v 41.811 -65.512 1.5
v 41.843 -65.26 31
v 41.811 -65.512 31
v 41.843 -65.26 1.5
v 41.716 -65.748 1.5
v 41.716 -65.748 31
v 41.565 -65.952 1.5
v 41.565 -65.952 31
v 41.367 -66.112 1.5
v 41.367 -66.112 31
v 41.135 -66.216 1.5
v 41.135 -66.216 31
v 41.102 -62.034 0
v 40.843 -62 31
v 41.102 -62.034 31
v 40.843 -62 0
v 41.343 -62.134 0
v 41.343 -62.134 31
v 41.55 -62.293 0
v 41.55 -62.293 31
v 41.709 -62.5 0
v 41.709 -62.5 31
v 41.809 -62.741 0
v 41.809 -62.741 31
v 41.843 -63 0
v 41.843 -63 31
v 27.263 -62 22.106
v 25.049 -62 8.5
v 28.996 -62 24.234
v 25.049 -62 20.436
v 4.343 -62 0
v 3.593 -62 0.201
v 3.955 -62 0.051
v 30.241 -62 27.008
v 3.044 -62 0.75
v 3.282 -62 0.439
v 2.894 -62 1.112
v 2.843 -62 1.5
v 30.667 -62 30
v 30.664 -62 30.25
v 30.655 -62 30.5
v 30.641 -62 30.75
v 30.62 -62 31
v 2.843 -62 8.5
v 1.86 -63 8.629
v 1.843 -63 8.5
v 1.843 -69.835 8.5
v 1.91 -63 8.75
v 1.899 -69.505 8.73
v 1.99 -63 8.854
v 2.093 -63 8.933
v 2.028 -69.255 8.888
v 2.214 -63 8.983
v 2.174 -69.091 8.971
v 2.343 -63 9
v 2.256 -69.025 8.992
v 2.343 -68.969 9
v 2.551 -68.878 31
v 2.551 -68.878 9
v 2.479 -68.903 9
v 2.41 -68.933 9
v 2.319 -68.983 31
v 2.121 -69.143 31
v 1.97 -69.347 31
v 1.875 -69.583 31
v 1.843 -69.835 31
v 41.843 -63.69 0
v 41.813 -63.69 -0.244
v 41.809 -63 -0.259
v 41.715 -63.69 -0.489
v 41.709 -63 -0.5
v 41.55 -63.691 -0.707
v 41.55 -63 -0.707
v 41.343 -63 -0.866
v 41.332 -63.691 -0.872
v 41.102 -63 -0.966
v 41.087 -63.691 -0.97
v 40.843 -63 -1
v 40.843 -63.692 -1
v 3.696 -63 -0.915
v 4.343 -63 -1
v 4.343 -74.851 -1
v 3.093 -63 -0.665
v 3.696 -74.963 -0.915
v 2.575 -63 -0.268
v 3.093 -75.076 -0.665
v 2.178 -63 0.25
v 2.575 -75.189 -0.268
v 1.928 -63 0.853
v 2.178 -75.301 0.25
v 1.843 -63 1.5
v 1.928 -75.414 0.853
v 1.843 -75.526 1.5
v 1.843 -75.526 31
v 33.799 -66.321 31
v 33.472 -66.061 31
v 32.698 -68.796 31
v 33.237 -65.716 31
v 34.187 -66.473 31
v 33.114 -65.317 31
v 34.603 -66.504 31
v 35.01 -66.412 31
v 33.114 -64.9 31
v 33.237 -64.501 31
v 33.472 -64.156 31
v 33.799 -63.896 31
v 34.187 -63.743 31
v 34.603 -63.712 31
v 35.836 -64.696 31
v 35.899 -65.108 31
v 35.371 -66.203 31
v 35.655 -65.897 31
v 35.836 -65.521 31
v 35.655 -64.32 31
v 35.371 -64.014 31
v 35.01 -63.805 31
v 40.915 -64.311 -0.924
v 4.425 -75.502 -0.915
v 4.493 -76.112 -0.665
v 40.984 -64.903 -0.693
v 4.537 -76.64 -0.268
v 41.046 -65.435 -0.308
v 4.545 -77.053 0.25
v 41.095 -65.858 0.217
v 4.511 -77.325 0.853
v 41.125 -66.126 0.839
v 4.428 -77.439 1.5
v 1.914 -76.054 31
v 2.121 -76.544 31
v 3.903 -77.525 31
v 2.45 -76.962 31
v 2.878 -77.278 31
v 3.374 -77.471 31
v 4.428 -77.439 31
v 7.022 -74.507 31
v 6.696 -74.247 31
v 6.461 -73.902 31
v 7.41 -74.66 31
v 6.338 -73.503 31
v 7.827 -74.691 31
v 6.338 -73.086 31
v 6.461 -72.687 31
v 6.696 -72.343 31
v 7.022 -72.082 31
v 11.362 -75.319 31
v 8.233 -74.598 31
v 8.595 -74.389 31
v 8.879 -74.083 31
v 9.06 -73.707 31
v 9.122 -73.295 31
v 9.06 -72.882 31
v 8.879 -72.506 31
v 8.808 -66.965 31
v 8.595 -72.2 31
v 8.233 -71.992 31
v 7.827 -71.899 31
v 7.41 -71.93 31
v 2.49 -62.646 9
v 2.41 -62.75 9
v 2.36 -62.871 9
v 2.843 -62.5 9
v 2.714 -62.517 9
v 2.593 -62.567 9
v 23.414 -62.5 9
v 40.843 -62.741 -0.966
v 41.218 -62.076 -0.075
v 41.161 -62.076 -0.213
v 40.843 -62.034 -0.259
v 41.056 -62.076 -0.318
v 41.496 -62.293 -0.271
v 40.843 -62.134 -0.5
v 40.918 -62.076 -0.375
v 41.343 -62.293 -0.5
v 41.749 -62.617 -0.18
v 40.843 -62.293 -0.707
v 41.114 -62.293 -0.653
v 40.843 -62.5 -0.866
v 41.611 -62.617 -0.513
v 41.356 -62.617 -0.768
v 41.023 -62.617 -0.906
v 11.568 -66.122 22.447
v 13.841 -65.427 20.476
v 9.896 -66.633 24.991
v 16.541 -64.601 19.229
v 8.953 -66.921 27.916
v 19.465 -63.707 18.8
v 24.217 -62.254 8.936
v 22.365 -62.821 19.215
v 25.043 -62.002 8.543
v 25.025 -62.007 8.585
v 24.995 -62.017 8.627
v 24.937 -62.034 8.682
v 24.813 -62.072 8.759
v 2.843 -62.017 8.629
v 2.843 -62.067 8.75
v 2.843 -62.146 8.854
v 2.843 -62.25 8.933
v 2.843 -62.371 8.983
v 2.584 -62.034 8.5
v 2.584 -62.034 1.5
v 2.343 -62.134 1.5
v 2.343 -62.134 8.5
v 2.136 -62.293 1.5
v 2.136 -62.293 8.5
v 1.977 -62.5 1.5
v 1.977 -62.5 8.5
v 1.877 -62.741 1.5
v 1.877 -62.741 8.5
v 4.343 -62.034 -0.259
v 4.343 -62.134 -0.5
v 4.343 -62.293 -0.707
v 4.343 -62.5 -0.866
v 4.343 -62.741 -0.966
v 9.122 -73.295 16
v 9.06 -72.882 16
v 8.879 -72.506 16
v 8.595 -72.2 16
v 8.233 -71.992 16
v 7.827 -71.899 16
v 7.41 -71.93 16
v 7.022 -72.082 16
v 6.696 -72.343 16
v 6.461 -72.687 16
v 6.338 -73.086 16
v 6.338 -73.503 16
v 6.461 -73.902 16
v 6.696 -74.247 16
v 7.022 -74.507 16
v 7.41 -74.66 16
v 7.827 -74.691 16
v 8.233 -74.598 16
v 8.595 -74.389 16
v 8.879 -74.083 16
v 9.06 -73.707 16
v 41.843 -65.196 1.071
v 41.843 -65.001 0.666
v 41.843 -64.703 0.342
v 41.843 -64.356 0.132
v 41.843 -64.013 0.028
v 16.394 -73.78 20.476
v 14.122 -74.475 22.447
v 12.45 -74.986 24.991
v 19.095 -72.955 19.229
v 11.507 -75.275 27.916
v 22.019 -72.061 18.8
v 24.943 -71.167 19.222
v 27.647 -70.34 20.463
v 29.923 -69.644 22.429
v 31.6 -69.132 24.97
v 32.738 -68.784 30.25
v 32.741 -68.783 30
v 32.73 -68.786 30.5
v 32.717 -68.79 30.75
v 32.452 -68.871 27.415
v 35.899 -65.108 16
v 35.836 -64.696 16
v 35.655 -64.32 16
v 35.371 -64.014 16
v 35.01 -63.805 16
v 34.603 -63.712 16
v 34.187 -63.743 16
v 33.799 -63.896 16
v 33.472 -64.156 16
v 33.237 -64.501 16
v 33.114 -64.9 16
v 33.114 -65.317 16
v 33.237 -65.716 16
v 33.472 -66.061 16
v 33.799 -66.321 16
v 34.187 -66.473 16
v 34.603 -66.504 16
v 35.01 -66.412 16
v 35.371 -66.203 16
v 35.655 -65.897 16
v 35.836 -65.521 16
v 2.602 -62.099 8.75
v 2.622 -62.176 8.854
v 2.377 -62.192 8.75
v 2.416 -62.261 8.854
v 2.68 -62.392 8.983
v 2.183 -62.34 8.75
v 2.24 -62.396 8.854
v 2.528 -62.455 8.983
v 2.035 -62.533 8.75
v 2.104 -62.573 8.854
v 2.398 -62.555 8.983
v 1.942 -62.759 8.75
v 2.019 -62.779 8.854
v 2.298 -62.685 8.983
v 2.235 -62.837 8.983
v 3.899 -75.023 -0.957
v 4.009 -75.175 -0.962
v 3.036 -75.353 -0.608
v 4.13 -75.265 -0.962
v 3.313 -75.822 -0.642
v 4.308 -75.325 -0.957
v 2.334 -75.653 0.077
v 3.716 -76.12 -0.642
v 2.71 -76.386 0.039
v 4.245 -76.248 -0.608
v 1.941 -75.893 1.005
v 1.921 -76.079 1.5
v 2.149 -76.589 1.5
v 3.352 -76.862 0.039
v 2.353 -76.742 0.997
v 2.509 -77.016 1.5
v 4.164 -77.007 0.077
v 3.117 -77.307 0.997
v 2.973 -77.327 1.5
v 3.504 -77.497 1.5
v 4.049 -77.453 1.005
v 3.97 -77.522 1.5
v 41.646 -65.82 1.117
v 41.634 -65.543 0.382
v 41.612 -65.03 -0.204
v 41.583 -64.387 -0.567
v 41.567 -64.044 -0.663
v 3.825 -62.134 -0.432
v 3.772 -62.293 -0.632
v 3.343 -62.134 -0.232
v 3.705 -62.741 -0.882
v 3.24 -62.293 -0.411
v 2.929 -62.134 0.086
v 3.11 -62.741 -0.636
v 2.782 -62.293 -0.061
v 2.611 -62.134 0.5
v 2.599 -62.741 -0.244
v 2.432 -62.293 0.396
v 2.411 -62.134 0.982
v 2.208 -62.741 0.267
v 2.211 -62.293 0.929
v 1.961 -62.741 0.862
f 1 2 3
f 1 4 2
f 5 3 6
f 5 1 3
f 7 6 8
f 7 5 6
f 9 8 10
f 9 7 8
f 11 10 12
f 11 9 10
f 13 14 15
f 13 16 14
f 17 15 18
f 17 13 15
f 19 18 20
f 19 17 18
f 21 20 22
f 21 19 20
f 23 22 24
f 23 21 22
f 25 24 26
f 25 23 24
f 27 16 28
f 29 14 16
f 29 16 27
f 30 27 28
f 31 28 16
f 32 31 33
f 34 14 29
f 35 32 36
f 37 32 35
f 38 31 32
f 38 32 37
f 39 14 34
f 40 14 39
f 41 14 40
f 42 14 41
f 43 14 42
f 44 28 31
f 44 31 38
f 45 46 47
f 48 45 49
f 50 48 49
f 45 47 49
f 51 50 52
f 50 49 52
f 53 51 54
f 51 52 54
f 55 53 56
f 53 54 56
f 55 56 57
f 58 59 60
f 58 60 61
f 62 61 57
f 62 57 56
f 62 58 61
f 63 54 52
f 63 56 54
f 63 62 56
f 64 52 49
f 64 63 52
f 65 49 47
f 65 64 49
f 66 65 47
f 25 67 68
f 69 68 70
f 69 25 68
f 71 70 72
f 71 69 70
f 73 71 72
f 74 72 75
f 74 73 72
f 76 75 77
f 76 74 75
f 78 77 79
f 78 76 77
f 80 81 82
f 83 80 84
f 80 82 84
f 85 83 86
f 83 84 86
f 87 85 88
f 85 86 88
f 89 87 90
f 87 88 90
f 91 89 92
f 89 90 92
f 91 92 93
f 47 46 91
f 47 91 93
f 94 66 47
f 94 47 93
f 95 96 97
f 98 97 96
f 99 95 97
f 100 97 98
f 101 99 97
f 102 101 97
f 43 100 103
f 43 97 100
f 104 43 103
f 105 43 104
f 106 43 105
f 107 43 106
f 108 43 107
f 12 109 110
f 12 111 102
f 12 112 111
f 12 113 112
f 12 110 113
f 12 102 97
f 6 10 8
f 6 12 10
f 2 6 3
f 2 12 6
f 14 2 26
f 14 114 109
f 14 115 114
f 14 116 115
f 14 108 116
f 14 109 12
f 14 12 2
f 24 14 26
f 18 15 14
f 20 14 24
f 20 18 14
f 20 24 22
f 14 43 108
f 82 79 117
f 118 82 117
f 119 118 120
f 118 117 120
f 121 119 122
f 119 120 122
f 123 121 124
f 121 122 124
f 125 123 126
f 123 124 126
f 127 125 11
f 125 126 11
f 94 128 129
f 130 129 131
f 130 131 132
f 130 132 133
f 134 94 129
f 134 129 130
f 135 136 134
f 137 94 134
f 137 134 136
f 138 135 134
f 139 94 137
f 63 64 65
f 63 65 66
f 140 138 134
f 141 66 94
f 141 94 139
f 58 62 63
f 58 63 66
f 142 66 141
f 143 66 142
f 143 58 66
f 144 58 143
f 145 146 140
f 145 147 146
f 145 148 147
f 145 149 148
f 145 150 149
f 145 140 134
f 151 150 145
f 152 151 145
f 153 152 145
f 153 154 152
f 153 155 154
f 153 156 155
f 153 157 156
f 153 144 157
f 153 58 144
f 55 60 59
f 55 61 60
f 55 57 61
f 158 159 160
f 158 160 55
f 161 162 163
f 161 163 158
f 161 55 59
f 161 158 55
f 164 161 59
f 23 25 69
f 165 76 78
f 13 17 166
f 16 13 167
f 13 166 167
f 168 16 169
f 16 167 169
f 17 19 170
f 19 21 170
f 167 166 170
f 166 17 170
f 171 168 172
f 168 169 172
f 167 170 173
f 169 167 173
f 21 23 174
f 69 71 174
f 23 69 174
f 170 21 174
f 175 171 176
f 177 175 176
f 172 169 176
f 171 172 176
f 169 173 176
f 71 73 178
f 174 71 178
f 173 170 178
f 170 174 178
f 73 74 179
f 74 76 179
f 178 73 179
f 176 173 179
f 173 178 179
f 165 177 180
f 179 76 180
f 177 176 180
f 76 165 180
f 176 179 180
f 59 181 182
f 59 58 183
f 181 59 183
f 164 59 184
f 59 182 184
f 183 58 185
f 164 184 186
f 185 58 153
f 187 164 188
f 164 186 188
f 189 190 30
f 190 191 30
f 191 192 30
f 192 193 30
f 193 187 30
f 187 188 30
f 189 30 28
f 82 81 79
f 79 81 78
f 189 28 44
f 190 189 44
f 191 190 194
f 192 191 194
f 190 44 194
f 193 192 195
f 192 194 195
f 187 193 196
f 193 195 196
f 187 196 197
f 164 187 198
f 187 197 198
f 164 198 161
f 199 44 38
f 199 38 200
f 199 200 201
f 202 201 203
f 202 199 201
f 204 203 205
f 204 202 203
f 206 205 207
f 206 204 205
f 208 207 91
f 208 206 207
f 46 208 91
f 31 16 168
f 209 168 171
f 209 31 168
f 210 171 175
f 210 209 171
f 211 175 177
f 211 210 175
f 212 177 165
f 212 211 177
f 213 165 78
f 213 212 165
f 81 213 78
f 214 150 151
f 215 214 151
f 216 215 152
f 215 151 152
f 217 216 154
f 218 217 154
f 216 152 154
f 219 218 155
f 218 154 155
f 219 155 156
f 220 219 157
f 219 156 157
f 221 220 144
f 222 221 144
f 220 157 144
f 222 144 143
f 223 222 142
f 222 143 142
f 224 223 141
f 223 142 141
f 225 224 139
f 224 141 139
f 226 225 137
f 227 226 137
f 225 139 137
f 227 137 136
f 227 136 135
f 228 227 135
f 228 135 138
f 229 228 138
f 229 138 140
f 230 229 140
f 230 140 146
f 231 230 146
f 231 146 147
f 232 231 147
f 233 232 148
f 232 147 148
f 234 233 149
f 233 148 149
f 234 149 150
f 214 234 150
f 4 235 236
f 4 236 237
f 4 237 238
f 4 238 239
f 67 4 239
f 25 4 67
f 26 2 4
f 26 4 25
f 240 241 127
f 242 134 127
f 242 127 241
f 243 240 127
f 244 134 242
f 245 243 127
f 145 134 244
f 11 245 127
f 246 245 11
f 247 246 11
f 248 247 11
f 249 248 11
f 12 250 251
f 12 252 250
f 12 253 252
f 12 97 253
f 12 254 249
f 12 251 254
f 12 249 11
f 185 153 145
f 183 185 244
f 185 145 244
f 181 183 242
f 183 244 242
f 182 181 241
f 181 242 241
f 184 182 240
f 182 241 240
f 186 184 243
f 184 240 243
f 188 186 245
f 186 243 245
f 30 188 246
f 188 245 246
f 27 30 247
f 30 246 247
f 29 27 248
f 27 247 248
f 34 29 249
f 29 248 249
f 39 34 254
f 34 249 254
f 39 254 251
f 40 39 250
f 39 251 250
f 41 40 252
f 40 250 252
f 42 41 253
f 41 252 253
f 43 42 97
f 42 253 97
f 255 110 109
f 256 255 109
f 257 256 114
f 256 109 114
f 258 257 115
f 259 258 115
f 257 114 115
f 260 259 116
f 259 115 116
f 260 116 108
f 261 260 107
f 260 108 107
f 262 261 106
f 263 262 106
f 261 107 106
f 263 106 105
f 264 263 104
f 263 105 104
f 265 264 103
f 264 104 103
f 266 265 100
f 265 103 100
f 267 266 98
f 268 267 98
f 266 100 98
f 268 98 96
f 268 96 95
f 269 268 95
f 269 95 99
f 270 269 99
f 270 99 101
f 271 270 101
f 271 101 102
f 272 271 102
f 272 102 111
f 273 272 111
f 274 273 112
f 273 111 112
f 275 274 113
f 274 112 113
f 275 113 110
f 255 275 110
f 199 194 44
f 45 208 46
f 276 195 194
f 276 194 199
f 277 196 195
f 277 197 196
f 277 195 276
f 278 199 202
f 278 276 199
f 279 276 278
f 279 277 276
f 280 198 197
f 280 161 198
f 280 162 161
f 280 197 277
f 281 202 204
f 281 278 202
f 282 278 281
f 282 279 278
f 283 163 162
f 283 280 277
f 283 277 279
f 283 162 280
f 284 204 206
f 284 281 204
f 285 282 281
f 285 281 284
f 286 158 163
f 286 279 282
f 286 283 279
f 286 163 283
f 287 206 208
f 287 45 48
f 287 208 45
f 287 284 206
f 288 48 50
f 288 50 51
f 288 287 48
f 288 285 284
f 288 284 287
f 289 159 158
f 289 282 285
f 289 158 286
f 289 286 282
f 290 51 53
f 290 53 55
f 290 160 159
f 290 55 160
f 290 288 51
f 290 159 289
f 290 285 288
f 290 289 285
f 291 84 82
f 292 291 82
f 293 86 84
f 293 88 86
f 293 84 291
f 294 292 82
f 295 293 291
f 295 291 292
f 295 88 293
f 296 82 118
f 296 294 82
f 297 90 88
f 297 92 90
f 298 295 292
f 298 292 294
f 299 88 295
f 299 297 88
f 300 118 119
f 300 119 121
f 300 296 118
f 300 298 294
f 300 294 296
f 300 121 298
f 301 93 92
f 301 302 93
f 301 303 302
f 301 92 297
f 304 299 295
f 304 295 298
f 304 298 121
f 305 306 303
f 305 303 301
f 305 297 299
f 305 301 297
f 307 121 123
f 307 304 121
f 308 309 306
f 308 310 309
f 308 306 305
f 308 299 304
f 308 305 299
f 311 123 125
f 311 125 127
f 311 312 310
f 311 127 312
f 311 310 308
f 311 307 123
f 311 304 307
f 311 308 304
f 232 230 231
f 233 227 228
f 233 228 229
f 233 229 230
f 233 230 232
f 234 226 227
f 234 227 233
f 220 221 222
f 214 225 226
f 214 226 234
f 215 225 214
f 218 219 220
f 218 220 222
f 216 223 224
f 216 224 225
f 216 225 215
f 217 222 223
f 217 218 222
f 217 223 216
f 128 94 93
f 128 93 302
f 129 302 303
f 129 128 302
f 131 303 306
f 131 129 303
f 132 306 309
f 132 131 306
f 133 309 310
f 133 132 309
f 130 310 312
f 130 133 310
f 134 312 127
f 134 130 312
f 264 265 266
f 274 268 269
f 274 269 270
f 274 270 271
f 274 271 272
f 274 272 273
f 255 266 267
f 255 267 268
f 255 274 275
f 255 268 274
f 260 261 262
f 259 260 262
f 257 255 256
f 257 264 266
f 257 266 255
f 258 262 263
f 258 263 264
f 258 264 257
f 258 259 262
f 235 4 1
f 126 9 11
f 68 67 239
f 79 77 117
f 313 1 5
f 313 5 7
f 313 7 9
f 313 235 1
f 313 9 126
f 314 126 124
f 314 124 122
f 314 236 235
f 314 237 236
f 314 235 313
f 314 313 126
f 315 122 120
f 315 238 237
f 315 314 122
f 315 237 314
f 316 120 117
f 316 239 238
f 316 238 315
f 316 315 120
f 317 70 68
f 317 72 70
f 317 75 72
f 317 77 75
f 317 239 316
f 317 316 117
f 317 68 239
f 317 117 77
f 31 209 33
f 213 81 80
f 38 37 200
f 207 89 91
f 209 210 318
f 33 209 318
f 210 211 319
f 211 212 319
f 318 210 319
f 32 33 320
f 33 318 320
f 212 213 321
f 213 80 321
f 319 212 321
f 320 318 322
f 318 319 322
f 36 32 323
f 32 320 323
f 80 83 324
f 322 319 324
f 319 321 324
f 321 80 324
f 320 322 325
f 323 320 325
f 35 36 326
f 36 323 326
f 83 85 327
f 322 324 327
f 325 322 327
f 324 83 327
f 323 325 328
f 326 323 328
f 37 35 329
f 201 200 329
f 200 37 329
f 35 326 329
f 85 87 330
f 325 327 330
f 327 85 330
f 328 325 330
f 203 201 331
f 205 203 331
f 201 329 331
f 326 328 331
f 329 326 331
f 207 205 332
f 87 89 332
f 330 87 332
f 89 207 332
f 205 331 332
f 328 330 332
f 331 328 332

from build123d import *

# Parameters (mm, degrees)
PAD005_DEPTH      = 31
PAD005_DEPTH_BACK = 1
SKETCH005_R       = 11.2
POCKET_DEPTH      = 15.56696
POCKET006_DEPTH   = 22
SKETCH016_R       = 1.4
POCKET009_DEPTH   = 15
FILLET003_R       = 2.5
FILLET004_R       = 1
FILLET005_R       = 1
FILLET006_R       = 1
FILLET007_R       = 0.5


with BuildPart() as part:
    # Sketch004 → Pad005 (new body, two sides)
    with BuildSketch(Plane.XY) as pad005_sk:
        with BuildLine():
            Line((41.8431, -62), (1.8431, -62))
            Line((1.8431, -62), (1.8431, -75.526382))
            ThreePointArc((1.8431, -75.526382), (2.653454, -77.134096), (4.427843, -77.438992))
            Line((4.427843, -77.438992), (41.8431, -66))
            Line((41.8431, -66), (41.8431, -62))
        make_face()
    extrude(amount=PAD005_DEPTH)
    extrude(pad005_sk.sketch, amount=-PAD005_DEPTH_BACK)

    # Sketch005 → Pocket (cut, through all)
    with BuildSketch(Plane(origin=(22.043577, -72.101291, 0), x_dir=(0.956305, 0.292372, 0), z_dir=(0.292372, -0.956305, 0))):
        with Locations((0, 30)):
            Circle(SKETCH005_R)
    extrude(amount=-POCKET_DEPTH, mode=Mode.SUBTRACT)

    # Sketch007 → Pocket006 (cut)
    with BuildSketch(Plane.XY.offset(31)):
        Polygon((-4.66376, -53.953282), (-5.90948, -71.46493), (38.1328, -58.000022), (37.116007, -54.0061), align=None)
    extrude(amount=-POCKET006_DEPTH, mode=Mode.SUBTRACT)

    # Sketch016 → Pocket009 (cut)
    with BuildSketch(Plane.XY.offset(31)):
        with Locations((34.498539, -65.108382)):
            Circle(SKETCH016_R)
        with Locations((7.722005, -73.29479)):
            Circle(SKETCH016_R)
    extrude(amount=-POCKET009_DEPTH, mode=Mode.SUBTRACT)

    # Fillet003
    fillet003_edges = [part.edges().sort_by_distance(p)[0] for p in [
        (23.135472, -71.719496, -1),
    ]]
    fillet(fillet003_edges, radius=FILLET003_R)

    # Fillet004
    fillet004_edges = [part.edges().sort_by_distance(p)[0] for p in [
        (41.8431, -66, 16.25),
    ]]
    fillet(fillet004_edges, radius=FILLET004_R)

    # Fillet005
    fillet005_edges = [part.edges().sort_by_distance(p)[0] for p in [
        (41.8431, -62, 15.5),
    ]]
    fillet(fillet005_edges, radius=FILLET005_R)

    # Fillet006
    fillet006_edges = [part.edges().sort_by_distance(p)[0] for p in [
        (1.8431, -69.094758, 20),
    ]]
    fillet(fillet006_edges, radius=FILLET006_R)

    # Fillet007
    fillet007_edges = [part.edges().sort_by_distance(p)[0] for p in [
        (1.8431, -66.047379, 9),
    ]]
    fillet(fillet007_edges, radius=FILLET007_R)


solid = part.part
